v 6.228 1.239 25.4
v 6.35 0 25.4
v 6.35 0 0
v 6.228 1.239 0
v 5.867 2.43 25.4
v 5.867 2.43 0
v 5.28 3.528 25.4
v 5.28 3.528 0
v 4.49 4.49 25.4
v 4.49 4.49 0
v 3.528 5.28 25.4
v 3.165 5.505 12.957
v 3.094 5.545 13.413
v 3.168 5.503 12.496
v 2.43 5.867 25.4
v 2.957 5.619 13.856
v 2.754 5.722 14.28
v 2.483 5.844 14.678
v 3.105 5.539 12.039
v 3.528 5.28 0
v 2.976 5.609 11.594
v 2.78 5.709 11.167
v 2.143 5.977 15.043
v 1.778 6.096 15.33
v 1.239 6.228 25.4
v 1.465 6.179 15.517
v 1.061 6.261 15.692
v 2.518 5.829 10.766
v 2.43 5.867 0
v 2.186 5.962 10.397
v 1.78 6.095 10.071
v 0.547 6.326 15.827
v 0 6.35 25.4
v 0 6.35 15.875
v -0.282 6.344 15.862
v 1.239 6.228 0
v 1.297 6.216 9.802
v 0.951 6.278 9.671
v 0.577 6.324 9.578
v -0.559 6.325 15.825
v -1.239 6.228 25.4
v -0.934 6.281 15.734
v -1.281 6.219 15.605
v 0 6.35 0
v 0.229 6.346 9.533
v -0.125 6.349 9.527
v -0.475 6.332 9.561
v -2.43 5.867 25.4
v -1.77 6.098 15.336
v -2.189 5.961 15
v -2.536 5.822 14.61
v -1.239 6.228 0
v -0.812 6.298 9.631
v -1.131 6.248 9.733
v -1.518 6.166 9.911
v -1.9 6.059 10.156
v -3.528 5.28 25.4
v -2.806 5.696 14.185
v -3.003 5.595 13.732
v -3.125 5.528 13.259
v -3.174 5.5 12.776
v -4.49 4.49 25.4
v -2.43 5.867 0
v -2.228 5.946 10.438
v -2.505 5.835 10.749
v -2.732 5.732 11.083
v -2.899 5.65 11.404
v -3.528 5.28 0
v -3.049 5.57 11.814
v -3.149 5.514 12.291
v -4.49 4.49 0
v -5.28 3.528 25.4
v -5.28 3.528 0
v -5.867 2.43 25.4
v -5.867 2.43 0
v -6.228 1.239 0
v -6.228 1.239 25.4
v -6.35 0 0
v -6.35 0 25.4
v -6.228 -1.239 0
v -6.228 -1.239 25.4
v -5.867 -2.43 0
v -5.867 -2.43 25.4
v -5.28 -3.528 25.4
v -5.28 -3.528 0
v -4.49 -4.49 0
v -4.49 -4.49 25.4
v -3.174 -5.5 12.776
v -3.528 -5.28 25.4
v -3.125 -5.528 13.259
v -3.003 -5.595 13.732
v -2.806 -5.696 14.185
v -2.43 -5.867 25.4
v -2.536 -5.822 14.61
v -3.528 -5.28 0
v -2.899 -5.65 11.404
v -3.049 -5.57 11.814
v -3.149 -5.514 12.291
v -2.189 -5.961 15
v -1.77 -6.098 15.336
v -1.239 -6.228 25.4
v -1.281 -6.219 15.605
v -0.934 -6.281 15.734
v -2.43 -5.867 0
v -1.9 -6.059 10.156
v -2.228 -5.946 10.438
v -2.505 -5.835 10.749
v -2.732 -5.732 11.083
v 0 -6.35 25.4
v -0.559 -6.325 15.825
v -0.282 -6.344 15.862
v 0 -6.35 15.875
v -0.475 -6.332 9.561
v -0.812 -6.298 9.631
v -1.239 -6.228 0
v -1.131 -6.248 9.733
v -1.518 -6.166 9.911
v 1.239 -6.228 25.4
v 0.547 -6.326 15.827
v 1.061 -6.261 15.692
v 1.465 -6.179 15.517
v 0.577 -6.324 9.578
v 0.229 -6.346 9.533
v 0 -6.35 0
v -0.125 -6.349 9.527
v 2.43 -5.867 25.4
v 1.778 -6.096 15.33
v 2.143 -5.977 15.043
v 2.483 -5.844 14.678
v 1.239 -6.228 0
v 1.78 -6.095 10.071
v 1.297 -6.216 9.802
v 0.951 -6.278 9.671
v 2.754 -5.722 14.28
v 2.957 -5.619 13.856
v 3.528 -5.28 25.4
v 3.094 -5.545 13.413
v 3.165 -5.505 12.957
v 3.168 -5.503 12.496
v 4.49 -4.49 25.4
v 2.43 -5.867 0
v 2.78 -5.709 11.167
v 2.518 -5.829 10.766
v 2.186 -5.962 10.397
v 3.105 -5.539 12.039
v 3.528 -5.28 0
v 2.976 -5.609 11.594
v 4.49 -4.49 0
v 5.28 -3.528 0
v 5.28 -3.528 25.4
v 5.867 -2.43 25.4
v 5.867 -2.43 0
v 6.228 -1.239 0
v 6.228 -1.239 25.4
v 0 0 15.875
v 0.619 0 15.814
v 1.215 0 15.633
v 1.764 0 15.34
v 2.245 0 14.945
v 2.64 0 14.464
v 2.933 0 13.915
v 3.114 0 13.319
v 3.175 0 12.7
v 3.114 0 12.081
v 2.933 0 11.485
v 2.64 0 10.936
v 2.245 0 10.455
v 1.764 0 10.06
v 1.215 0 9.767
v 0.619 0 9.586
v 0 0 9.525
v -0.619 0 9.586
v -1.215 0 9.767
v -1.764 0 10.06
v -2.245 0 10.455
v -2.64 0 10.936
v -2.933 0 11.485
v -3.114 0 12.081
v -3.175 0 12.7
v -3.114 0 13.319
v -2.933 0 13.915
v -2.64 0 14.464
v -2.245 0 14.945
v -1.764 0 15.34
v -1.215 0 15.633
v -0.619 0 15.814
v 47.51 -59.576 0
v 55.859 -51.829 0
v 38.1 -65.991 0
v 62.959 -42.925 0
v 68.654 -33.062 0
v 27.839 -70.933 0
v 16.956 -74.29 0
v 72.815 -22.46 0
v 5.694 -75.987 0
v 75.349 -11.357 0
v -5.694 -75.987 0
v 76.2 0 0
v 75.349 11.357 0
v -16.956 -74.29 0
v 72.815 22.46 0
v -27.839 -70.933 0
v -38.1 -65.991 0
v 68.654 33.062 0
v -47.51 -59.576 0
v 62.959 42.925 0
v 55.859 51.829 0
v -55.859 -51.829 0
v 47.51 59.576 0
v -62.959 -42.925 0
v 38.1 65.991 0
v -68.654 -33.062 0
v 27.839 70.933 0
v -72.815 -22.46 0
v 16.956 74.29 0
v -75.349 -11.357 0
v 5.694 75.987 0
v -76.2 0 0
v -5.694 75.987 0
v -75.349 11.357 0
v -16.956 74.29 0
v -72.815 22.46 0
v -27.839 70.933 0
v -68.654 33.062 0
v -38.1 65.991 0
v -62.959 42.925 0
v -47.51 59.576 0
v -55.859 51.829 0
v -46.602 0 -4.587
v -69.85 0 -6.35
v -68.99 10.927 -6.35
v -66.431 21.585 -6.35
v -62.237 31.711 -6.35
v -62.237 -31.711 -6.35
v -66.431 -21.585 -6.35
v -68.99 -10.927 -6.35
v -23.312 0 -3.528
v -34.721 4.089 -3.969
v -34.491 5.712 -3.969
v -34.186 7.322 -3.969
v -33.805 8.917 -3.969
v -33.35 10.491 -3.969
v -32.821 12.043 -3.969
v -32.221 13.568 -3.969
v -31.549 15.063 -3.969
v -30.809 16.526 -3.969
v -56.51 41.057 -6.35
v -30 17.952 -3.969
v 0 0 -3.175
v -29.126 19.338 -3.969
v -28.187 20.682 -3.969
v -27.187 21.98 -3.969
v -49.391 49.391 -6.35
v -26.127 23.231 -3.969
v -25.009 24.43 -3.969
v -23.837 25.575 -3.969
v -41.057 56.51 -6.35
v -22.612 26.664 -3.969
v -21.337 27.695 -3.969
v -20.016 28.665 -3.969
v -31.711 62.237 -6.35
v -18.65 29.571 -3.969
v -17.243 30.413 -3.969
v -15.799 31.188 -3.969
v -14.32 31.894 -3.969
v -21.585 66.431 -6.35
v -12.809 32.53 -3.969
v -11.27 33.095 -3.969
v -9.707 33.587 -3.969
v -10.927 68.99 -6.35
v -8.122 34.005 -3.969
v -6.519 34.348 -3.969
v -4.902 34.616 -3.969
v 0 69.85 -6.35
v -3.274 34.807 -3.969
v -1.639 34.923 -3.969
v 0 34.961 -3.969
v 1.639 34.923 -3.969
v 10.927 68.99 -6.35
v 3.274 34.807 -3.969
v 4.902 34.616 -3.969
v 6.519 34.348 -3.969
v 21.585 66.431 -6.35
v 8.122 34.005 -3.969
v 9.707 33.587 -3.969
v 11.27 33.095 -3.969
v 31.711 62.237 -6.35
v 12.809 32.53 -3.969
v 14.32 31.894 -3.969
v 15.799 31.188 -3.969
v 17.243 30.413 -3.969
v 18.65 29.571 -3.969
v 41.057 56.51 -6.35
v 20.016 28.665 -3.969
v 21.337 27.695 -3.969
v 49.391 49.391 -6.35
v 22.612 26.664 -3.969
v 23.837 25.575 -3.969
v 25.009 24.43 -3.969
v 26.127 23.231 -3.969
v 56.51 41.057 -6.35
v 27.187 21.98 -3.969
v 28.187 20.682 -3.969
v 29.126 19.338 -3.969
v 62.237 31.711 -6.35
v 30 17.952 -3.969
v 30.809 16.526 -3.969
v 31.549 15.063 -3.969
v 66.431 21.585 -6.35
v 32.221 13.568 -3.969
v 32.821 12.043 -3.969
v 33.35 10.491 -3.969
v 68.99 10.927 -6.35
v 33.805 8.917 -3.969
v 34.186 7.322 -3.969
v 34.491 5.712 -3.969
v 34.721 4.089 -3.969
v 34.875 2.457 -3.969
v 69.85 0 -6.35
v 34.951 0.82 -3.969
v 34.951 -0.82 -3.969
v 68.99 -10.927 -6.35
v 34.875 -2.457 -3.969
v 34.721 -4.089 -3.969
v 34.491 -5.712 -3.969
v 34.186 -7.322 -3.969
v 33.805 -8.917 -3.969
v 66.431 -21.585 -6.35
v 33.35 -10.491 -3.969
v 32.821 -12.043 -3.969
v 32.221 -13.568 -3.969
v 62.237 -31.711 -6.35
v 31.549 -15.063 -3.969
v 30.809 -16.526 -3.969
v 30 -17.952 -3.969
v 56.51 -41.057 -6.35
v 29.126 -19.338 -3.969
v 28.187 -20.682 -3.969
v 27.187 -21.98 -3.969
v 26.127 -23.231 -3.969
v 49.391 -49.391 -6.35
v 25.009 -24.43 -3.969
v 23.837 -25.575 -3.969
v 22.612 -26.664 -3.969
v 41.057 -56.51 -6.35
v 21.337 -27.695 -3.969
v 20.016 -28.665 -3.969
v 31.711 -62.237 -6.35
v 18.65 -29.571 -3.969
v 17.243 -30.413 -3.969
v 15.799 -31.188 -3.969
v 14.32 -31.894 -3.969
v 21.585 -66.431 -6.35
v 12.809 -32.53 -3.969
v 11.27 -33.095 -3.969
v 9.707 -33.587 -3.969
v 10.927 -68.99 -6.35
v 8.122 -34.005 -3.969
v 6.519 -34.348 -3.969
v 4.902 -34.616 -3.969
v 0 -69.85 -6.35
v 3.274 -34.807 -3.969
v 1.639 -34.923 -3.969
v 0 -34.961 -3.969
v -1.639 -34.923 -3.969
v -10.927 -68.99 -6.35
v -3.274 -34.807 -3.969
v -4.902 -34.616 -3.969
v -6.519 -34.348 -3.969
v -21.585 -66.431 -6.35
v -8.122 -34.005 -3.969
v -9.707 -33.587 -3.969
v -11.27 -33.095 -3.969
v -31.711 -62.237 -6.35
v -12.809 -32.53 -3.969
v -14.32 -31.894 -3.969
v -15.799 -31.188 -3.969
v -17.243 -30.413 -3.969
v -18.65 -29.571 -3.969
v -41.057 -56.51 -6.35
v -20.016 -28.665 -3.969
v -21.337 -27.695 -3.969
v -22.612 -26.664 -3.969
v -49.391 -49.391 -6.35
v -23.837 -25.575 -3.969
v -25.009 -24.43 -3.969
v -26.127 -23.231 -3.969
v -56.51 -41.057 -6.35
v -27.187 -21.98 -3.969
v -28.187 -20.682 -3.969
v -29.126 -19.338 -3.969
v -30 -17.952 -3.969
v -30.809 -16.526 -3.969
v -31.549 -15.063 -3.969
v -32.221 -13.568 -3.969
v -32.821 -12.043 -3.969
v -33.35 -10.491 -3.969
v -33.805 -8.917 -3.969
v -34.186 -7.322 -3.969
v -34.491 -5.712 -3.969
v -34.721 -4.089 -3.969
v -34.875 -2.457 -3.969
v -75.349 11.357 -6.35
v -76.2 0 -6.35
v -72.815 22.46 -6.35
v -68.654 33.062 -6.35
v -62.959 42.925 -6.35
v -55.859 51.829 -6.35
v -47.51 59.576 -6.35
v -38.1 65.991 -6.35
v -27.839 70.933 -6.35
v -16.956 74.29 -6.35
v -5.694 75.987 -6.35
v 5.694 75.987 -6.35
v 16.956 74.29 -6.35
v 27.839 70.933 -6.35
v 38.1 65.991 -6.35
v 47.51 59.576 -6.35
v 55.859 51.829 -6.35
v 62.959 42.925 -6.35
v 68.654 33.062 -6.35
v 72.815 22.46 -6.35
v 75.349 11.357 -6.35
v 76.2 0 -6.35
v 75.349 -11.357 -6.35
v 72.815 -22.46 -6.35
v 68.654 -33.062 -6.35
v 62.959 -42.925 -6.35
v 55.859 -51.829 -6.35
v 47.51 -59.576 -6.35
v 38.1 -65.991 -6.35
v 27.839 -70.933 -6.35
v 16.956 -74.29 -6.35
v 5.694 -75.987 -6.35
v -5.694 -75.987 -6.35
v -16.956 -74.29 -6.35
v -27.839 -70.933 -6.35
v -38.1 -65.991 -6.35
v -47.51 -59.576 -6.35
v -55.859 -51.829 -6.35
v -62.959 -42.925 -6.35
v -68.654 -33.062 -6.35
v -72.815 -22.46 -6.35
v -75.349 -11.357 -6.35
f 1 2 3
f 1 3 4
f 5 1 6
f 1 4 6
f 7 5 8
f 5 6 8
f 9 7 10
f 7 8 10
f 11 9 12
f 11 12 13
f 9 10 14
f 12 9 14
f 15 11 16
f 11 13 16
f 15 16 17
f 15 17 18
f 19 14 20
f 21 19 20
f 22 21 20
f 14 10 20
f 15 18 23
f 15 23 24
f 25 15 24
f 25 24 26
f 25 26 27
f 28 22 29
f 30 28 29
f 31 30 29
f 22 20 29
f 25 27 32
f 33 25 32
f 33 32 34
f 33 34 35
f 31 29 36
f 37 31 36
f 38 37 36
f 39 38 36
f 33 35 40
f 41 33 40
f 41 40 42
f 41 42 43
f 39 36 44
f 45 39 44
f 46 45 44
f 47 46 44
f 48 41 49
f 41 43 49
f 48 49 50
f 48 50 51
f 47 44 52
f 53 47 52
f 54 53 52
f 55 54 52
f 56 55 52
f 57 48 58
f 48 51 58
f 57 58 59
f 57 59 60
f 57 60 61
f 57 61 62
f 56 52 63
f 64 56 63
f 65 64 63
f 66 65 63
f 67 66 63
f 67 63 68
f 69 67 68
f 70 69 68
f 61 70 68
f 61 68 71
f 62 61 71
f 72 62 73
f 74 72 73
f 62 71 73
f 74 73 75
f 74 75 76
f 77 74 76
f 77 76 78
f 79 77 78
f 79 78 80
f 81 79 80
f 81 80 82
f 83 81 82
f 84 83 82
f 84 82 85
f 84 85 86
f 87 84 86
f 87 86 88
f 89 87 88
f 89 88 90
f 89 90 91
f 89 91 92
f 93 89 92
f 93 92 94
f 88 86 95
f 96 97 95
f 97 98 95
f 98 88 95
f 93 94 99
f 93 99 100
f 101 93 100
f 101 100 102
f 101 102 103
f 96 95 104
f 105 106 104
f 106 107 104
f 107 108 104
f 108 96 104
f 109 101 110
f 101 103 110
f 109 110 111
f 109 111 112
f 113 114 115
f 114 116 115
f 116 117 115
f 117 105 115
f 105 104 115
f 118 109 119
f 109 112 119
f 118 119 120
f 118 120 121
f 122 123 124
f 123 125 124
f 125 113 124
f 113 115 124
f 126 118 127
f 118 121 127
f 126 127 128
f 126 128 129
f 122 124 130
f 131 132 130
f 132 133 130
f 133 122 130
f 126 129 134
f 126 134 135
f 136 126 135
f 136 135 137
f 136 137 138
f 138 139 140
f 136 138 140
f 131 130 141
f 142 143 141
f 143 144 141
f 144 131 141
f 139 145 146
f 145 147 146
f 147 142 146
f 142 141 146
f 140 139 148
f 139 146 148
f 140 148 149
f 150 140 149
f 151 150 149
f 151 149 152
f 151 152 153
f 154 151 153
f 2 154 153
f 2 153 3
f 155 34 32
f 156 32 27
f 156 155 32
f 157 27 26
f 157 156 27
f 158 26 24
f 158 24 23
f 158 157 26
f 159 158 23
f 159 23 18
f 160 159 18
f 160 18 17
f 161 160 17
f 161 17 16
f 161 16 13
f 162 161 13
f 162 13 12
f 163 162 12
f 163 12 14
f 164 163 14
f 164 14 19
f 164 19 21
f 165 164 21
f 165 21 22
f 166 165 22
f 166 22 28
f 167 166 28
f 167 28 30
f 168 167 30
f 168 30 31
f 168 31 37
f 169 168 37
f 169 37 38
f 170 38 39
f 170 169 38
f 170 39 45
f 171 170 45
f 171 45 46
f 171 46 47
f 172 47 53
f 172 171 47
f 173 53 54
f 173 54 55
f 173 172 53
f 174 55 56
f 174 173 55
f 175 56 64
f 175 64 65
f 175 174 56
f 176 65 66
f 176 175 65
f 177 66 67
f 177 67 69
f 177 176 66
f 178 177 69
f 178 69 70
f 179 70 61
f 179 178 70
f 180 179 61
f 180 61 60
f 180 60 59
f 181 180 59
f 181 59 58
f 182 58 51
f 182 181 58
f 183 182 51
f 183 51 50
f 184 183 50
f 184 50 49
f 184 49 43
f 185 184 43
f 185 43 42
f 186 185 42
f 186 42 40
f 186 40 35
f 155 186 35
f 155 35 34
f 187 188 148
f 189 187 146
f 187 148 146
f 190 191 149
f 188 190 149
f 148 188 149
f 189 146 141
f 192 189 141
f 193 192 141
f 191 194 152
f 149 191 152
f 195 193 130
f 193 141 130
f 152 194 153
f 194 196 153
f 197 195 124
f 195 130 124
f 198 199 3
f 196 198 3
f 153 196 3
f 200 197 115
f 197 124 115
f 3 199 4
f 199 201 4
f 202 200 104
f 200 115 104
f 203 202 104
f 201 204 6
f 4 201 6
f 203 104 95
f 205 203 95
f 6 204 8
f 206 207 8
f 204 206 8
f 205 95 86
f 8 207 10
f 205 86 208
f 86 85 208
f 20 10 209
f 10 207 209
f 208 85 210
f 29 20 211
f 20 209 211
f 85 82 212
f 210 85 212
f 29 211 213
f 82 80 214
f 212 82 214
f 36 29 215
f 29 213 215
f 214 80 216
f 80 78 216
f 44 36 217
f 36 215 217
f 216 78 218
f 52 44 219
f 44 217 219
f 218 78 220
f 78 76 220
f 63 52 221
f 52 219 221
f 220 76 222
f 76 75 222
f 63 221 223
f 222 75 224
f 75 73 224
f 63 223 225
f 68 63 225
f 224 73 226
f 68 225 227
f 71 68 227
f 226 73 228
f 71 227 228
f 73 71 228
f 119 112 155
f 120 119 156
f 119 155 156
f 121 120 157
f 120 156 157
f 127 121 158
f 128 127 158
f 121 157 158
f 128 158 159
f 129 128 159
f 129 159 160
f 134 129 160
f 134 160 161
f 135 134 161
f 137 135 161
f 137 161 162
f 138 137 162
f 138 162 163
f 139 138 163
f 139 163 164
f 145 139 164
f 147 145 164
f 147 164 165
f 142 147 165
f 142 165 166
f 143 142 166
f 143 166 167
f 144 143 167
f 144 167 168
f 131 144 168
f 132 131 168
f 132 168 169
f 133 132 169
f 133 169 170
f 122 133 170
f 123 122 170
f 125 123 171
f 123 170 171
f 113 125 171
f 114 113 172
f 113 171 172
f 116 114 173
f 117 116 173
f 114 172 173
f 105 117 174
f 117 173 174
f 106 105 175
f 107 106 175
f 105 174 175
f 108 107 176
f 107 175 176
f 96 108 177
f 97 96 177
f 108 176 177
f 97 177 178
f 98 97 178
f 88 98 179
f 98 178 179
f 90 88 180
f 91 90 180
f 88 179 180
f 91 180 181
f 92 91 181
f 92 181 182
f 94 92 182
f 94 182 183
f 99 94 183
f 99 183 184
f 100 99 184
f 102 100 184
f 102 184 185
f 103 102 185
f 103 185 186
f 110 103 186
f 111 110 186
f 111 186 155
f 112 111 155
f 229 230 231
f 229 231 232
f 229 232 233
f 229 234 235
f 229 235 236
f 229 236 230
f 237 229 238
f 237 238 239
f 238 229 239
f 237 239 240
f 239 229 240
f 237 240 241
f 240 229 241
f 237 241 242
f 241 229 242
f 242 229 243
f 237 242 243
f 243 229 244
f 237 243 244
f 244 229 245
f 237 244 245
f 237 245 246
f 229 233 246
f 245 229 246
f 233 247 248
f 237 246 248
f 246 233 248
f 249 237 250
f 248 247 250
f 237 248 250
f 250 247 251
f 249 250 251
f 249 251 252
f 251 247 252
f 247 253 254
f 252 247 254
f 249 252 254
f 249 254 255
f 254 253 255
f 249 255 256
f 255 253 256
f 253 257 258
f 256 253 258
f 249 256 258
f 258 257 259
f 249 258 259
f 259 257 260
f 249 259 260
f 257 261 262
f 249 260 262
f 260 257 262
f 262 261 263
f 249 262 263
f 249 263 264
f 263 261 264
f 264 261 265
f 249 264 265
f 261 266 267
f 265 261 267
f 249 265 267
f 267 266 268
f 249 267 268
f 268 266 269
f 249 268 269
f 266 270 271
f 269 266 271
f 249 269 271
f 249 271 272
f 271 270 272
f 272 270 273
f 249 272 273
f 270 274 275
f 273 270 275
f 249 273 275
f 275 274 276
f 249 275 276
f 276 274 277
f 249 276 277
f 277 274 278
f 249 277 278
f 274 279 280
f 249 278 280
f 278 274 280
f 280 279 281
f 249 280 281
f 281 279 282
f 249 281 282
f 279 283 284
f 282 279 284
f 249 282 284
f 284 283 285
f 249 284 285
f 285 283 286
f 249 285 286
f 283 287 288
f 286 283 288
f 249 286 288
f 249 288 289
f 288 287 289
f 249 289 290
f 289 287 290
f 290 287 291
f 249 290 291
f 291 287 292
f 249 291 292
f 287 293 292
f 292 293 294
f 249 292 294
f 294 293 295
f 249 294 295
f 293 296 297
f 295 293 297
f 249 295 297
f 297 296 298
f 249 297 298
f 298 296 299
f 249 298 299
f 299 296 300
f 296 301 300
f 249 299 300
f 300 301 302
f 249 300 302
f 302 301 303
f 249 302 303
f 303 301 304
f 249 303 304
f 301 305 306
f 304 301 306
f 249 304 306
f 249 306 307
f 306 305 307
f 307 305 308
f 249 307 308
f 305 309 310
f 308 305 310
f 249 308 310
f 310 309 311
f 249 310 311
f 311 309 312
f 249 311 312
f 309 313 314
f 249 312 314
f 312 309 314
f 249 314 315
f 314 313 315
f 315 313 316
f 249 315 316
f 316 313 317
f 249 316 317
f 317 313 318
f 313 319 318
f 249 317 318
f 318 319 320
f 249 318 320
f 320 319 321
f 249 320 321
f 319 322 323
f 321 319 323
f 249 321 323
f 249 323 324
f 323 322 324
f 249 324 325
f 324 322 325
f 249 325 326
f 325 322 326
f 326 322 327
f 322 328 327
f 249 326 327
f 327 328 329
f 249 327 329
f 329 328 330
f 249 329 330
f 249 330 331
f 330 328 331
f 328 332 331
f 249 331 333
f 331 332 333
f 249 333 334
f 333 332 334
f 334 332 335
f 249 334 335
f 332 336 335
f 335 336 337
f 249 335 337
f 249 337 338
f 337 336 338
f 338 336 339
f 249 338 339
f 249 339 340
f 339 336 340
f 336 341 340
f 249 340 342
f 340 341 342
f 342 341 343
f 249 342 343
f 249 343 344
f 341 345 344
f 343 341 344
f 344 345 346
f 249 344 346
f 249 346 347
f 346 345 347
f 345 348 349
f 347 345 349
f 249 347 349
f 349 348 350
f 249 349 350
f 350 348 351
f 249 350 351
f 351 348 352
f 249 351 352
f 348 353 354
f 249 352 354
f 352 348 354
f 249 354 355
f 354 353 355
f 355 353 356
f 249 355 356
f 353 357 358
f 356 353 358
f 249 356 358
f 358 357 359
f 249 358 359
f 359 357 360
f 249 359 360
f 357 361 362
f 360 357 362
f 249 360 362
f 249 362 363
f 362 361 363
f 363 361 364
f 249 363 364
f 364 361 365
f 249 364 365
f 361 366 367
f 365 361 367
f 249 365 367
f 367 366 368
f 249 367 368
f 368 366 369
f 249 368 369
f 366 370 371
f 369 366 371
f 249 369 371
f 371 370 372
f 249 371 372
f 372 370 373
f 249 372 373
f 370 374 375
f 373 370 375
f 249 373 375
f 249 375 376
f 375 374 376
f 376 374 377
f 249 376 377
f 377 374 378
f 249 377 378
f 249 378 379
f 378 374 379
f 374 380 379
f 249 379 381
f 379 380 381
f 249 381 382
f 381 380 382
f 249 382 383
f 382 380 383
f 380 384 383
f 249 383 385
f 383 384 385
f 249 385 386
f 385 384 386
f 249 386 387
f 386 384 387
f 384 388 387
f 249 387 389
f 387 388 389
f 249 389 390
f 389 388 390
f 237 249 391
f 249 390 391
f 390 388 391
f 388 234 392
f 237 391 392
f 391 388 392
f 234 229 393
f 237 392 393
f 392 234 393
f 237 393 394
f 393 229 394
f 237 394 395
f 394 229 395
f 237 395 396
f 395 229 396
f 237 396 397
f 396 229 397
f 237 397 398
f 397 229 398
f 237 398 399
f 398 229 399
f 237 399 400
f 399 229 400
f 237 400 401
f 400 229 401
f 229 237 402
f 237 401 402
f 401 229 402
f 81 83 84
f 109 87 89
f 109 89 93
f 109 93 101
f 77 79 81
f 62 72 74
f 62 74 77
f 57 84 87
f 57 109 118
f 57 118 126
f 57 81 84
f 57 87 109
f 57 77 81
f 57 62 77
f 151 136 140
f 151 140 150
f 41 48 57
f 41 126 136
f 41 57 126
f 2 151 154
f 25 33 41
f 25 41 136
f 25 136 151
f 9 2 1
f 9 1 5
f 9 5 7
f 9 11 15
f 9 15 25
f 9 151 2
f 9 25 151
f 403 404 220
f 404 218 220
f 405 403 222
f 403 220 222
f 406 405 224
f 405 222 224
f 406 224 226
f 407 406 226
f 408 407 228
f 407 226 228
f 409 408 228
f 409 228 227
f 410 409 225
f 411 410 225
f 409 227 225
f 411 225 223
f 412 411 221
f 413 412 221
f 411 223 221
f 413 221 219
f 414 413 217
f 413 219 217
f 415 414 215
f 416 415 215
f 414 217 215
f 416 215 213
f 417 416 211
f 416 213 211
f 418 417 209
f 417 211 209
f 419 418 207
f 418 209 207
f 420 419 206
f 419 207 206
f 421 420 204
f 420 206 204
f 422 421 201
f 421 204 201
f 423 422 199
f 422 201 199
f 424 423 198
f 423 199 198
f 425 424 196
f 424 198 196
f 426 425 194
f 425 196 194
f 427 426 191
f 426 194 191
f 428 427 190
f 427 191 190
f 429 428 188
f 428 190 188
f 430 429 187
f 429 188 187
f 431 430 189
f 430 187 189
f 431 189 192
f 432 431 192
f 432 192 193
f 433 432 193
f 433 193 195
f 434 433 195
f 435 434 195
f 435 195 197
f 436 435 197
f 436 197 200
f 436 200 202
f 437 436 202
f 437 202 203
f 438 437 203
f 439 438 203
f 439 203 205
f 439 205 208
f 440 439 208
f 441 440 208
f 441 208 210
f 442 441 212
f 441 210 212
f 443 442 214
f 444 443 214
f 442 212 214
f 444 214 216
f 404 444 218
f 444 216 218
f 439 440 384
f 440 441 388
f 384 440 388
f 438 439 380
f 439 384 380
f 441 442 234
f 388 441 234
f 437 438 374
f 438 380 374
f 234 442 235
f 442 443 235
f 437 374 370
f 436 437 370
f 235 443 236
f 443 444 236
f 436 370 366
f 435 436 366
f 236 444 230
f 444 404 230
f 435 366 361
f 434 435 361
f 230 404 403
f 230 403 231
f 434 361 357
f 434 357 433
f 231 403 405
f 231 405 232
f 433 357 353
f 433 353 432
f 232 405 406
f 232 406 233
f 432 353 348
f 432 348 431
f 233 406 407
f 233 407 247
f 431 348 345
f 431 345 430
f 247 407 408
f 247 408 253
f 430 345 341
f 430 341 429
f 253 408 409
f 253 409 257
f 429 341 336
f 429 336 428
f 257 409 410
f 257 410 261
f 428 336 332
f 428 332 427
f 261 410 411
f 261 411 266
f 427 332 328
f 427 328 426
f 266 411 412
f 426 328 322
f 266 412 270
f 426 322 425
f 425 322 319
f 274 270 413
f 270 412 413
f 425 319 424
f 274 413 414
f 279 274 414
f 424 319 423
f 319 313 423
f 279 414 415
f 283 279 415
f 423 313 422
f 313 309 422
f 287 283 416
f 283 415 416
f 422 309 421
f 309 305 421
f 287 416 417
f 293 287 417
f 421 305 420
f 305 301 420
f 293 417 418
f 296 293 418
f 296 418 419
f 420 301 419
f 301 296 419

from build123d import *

# Parameters (mm, degrees)
SKETCH2_R               = 6.35
BOSS_EXTRUDE1_DEPTH     = 25.4
SKETCH3_R               = 3.175
CUT_EXTRUDE1_DEPTH      = 7.35
CUT_EXTRUDE1_DEPTH_BACK = 7.35


with BuildPart() as part:
    # Sketch2 → Boss-Extrude1 (new body)
    with BuildSketch(Plane.XY):
        Circle(SKETCH2_R)
    extrude(amount=BOSS_EXTRUDE1_DEPTH)

    # Sketch3 → Cut-Extrude1 (cut, two sides)
    with BuildSketch(Plane(origin=(0, 0, 0), x_dir=(1, 0, 0), z_dir=(0, 1, 0))) as cut_extrude1_sk:
        with Locations(Location((0, -12.7, 0), (0, 0, 270))):  # turned: the seam where the file's is
            Circle(SKETCH3_R)
    extrude(amount=CUT_EXTRUDE1_DEPTH, mode=Mode.SUBTRACT)
    extrude(cut_extrude1_sk.sketch, amount=-CUT_EXTRUDE1_DEPTH_BACK, mode=Mode.SUBTRACT)

    # Sketch7 → Revolve2 (revolve)
    with BuildSketch(Plane(origin=(0, 0, 0), x_dir=(1, 0, 0), z_dir=(0, 1, 0))):
        with BuildLine():
            Line((-69.85, 6.35), (-76.2, 6.35))
            Line((-76.2, 6.35), (-76.2, 0))
            Line((-76.2, 0), (0, 0))
            Line((0, 0), (0, 3.175))
            ThreePointArc((0, 3.175), (-34.961060929, 3.969159572), (-69.85, 6.35))
        make_face()
    revolve(axis=Axis((0, 0, 50), (0, 0, -1)))


solid = part.part
